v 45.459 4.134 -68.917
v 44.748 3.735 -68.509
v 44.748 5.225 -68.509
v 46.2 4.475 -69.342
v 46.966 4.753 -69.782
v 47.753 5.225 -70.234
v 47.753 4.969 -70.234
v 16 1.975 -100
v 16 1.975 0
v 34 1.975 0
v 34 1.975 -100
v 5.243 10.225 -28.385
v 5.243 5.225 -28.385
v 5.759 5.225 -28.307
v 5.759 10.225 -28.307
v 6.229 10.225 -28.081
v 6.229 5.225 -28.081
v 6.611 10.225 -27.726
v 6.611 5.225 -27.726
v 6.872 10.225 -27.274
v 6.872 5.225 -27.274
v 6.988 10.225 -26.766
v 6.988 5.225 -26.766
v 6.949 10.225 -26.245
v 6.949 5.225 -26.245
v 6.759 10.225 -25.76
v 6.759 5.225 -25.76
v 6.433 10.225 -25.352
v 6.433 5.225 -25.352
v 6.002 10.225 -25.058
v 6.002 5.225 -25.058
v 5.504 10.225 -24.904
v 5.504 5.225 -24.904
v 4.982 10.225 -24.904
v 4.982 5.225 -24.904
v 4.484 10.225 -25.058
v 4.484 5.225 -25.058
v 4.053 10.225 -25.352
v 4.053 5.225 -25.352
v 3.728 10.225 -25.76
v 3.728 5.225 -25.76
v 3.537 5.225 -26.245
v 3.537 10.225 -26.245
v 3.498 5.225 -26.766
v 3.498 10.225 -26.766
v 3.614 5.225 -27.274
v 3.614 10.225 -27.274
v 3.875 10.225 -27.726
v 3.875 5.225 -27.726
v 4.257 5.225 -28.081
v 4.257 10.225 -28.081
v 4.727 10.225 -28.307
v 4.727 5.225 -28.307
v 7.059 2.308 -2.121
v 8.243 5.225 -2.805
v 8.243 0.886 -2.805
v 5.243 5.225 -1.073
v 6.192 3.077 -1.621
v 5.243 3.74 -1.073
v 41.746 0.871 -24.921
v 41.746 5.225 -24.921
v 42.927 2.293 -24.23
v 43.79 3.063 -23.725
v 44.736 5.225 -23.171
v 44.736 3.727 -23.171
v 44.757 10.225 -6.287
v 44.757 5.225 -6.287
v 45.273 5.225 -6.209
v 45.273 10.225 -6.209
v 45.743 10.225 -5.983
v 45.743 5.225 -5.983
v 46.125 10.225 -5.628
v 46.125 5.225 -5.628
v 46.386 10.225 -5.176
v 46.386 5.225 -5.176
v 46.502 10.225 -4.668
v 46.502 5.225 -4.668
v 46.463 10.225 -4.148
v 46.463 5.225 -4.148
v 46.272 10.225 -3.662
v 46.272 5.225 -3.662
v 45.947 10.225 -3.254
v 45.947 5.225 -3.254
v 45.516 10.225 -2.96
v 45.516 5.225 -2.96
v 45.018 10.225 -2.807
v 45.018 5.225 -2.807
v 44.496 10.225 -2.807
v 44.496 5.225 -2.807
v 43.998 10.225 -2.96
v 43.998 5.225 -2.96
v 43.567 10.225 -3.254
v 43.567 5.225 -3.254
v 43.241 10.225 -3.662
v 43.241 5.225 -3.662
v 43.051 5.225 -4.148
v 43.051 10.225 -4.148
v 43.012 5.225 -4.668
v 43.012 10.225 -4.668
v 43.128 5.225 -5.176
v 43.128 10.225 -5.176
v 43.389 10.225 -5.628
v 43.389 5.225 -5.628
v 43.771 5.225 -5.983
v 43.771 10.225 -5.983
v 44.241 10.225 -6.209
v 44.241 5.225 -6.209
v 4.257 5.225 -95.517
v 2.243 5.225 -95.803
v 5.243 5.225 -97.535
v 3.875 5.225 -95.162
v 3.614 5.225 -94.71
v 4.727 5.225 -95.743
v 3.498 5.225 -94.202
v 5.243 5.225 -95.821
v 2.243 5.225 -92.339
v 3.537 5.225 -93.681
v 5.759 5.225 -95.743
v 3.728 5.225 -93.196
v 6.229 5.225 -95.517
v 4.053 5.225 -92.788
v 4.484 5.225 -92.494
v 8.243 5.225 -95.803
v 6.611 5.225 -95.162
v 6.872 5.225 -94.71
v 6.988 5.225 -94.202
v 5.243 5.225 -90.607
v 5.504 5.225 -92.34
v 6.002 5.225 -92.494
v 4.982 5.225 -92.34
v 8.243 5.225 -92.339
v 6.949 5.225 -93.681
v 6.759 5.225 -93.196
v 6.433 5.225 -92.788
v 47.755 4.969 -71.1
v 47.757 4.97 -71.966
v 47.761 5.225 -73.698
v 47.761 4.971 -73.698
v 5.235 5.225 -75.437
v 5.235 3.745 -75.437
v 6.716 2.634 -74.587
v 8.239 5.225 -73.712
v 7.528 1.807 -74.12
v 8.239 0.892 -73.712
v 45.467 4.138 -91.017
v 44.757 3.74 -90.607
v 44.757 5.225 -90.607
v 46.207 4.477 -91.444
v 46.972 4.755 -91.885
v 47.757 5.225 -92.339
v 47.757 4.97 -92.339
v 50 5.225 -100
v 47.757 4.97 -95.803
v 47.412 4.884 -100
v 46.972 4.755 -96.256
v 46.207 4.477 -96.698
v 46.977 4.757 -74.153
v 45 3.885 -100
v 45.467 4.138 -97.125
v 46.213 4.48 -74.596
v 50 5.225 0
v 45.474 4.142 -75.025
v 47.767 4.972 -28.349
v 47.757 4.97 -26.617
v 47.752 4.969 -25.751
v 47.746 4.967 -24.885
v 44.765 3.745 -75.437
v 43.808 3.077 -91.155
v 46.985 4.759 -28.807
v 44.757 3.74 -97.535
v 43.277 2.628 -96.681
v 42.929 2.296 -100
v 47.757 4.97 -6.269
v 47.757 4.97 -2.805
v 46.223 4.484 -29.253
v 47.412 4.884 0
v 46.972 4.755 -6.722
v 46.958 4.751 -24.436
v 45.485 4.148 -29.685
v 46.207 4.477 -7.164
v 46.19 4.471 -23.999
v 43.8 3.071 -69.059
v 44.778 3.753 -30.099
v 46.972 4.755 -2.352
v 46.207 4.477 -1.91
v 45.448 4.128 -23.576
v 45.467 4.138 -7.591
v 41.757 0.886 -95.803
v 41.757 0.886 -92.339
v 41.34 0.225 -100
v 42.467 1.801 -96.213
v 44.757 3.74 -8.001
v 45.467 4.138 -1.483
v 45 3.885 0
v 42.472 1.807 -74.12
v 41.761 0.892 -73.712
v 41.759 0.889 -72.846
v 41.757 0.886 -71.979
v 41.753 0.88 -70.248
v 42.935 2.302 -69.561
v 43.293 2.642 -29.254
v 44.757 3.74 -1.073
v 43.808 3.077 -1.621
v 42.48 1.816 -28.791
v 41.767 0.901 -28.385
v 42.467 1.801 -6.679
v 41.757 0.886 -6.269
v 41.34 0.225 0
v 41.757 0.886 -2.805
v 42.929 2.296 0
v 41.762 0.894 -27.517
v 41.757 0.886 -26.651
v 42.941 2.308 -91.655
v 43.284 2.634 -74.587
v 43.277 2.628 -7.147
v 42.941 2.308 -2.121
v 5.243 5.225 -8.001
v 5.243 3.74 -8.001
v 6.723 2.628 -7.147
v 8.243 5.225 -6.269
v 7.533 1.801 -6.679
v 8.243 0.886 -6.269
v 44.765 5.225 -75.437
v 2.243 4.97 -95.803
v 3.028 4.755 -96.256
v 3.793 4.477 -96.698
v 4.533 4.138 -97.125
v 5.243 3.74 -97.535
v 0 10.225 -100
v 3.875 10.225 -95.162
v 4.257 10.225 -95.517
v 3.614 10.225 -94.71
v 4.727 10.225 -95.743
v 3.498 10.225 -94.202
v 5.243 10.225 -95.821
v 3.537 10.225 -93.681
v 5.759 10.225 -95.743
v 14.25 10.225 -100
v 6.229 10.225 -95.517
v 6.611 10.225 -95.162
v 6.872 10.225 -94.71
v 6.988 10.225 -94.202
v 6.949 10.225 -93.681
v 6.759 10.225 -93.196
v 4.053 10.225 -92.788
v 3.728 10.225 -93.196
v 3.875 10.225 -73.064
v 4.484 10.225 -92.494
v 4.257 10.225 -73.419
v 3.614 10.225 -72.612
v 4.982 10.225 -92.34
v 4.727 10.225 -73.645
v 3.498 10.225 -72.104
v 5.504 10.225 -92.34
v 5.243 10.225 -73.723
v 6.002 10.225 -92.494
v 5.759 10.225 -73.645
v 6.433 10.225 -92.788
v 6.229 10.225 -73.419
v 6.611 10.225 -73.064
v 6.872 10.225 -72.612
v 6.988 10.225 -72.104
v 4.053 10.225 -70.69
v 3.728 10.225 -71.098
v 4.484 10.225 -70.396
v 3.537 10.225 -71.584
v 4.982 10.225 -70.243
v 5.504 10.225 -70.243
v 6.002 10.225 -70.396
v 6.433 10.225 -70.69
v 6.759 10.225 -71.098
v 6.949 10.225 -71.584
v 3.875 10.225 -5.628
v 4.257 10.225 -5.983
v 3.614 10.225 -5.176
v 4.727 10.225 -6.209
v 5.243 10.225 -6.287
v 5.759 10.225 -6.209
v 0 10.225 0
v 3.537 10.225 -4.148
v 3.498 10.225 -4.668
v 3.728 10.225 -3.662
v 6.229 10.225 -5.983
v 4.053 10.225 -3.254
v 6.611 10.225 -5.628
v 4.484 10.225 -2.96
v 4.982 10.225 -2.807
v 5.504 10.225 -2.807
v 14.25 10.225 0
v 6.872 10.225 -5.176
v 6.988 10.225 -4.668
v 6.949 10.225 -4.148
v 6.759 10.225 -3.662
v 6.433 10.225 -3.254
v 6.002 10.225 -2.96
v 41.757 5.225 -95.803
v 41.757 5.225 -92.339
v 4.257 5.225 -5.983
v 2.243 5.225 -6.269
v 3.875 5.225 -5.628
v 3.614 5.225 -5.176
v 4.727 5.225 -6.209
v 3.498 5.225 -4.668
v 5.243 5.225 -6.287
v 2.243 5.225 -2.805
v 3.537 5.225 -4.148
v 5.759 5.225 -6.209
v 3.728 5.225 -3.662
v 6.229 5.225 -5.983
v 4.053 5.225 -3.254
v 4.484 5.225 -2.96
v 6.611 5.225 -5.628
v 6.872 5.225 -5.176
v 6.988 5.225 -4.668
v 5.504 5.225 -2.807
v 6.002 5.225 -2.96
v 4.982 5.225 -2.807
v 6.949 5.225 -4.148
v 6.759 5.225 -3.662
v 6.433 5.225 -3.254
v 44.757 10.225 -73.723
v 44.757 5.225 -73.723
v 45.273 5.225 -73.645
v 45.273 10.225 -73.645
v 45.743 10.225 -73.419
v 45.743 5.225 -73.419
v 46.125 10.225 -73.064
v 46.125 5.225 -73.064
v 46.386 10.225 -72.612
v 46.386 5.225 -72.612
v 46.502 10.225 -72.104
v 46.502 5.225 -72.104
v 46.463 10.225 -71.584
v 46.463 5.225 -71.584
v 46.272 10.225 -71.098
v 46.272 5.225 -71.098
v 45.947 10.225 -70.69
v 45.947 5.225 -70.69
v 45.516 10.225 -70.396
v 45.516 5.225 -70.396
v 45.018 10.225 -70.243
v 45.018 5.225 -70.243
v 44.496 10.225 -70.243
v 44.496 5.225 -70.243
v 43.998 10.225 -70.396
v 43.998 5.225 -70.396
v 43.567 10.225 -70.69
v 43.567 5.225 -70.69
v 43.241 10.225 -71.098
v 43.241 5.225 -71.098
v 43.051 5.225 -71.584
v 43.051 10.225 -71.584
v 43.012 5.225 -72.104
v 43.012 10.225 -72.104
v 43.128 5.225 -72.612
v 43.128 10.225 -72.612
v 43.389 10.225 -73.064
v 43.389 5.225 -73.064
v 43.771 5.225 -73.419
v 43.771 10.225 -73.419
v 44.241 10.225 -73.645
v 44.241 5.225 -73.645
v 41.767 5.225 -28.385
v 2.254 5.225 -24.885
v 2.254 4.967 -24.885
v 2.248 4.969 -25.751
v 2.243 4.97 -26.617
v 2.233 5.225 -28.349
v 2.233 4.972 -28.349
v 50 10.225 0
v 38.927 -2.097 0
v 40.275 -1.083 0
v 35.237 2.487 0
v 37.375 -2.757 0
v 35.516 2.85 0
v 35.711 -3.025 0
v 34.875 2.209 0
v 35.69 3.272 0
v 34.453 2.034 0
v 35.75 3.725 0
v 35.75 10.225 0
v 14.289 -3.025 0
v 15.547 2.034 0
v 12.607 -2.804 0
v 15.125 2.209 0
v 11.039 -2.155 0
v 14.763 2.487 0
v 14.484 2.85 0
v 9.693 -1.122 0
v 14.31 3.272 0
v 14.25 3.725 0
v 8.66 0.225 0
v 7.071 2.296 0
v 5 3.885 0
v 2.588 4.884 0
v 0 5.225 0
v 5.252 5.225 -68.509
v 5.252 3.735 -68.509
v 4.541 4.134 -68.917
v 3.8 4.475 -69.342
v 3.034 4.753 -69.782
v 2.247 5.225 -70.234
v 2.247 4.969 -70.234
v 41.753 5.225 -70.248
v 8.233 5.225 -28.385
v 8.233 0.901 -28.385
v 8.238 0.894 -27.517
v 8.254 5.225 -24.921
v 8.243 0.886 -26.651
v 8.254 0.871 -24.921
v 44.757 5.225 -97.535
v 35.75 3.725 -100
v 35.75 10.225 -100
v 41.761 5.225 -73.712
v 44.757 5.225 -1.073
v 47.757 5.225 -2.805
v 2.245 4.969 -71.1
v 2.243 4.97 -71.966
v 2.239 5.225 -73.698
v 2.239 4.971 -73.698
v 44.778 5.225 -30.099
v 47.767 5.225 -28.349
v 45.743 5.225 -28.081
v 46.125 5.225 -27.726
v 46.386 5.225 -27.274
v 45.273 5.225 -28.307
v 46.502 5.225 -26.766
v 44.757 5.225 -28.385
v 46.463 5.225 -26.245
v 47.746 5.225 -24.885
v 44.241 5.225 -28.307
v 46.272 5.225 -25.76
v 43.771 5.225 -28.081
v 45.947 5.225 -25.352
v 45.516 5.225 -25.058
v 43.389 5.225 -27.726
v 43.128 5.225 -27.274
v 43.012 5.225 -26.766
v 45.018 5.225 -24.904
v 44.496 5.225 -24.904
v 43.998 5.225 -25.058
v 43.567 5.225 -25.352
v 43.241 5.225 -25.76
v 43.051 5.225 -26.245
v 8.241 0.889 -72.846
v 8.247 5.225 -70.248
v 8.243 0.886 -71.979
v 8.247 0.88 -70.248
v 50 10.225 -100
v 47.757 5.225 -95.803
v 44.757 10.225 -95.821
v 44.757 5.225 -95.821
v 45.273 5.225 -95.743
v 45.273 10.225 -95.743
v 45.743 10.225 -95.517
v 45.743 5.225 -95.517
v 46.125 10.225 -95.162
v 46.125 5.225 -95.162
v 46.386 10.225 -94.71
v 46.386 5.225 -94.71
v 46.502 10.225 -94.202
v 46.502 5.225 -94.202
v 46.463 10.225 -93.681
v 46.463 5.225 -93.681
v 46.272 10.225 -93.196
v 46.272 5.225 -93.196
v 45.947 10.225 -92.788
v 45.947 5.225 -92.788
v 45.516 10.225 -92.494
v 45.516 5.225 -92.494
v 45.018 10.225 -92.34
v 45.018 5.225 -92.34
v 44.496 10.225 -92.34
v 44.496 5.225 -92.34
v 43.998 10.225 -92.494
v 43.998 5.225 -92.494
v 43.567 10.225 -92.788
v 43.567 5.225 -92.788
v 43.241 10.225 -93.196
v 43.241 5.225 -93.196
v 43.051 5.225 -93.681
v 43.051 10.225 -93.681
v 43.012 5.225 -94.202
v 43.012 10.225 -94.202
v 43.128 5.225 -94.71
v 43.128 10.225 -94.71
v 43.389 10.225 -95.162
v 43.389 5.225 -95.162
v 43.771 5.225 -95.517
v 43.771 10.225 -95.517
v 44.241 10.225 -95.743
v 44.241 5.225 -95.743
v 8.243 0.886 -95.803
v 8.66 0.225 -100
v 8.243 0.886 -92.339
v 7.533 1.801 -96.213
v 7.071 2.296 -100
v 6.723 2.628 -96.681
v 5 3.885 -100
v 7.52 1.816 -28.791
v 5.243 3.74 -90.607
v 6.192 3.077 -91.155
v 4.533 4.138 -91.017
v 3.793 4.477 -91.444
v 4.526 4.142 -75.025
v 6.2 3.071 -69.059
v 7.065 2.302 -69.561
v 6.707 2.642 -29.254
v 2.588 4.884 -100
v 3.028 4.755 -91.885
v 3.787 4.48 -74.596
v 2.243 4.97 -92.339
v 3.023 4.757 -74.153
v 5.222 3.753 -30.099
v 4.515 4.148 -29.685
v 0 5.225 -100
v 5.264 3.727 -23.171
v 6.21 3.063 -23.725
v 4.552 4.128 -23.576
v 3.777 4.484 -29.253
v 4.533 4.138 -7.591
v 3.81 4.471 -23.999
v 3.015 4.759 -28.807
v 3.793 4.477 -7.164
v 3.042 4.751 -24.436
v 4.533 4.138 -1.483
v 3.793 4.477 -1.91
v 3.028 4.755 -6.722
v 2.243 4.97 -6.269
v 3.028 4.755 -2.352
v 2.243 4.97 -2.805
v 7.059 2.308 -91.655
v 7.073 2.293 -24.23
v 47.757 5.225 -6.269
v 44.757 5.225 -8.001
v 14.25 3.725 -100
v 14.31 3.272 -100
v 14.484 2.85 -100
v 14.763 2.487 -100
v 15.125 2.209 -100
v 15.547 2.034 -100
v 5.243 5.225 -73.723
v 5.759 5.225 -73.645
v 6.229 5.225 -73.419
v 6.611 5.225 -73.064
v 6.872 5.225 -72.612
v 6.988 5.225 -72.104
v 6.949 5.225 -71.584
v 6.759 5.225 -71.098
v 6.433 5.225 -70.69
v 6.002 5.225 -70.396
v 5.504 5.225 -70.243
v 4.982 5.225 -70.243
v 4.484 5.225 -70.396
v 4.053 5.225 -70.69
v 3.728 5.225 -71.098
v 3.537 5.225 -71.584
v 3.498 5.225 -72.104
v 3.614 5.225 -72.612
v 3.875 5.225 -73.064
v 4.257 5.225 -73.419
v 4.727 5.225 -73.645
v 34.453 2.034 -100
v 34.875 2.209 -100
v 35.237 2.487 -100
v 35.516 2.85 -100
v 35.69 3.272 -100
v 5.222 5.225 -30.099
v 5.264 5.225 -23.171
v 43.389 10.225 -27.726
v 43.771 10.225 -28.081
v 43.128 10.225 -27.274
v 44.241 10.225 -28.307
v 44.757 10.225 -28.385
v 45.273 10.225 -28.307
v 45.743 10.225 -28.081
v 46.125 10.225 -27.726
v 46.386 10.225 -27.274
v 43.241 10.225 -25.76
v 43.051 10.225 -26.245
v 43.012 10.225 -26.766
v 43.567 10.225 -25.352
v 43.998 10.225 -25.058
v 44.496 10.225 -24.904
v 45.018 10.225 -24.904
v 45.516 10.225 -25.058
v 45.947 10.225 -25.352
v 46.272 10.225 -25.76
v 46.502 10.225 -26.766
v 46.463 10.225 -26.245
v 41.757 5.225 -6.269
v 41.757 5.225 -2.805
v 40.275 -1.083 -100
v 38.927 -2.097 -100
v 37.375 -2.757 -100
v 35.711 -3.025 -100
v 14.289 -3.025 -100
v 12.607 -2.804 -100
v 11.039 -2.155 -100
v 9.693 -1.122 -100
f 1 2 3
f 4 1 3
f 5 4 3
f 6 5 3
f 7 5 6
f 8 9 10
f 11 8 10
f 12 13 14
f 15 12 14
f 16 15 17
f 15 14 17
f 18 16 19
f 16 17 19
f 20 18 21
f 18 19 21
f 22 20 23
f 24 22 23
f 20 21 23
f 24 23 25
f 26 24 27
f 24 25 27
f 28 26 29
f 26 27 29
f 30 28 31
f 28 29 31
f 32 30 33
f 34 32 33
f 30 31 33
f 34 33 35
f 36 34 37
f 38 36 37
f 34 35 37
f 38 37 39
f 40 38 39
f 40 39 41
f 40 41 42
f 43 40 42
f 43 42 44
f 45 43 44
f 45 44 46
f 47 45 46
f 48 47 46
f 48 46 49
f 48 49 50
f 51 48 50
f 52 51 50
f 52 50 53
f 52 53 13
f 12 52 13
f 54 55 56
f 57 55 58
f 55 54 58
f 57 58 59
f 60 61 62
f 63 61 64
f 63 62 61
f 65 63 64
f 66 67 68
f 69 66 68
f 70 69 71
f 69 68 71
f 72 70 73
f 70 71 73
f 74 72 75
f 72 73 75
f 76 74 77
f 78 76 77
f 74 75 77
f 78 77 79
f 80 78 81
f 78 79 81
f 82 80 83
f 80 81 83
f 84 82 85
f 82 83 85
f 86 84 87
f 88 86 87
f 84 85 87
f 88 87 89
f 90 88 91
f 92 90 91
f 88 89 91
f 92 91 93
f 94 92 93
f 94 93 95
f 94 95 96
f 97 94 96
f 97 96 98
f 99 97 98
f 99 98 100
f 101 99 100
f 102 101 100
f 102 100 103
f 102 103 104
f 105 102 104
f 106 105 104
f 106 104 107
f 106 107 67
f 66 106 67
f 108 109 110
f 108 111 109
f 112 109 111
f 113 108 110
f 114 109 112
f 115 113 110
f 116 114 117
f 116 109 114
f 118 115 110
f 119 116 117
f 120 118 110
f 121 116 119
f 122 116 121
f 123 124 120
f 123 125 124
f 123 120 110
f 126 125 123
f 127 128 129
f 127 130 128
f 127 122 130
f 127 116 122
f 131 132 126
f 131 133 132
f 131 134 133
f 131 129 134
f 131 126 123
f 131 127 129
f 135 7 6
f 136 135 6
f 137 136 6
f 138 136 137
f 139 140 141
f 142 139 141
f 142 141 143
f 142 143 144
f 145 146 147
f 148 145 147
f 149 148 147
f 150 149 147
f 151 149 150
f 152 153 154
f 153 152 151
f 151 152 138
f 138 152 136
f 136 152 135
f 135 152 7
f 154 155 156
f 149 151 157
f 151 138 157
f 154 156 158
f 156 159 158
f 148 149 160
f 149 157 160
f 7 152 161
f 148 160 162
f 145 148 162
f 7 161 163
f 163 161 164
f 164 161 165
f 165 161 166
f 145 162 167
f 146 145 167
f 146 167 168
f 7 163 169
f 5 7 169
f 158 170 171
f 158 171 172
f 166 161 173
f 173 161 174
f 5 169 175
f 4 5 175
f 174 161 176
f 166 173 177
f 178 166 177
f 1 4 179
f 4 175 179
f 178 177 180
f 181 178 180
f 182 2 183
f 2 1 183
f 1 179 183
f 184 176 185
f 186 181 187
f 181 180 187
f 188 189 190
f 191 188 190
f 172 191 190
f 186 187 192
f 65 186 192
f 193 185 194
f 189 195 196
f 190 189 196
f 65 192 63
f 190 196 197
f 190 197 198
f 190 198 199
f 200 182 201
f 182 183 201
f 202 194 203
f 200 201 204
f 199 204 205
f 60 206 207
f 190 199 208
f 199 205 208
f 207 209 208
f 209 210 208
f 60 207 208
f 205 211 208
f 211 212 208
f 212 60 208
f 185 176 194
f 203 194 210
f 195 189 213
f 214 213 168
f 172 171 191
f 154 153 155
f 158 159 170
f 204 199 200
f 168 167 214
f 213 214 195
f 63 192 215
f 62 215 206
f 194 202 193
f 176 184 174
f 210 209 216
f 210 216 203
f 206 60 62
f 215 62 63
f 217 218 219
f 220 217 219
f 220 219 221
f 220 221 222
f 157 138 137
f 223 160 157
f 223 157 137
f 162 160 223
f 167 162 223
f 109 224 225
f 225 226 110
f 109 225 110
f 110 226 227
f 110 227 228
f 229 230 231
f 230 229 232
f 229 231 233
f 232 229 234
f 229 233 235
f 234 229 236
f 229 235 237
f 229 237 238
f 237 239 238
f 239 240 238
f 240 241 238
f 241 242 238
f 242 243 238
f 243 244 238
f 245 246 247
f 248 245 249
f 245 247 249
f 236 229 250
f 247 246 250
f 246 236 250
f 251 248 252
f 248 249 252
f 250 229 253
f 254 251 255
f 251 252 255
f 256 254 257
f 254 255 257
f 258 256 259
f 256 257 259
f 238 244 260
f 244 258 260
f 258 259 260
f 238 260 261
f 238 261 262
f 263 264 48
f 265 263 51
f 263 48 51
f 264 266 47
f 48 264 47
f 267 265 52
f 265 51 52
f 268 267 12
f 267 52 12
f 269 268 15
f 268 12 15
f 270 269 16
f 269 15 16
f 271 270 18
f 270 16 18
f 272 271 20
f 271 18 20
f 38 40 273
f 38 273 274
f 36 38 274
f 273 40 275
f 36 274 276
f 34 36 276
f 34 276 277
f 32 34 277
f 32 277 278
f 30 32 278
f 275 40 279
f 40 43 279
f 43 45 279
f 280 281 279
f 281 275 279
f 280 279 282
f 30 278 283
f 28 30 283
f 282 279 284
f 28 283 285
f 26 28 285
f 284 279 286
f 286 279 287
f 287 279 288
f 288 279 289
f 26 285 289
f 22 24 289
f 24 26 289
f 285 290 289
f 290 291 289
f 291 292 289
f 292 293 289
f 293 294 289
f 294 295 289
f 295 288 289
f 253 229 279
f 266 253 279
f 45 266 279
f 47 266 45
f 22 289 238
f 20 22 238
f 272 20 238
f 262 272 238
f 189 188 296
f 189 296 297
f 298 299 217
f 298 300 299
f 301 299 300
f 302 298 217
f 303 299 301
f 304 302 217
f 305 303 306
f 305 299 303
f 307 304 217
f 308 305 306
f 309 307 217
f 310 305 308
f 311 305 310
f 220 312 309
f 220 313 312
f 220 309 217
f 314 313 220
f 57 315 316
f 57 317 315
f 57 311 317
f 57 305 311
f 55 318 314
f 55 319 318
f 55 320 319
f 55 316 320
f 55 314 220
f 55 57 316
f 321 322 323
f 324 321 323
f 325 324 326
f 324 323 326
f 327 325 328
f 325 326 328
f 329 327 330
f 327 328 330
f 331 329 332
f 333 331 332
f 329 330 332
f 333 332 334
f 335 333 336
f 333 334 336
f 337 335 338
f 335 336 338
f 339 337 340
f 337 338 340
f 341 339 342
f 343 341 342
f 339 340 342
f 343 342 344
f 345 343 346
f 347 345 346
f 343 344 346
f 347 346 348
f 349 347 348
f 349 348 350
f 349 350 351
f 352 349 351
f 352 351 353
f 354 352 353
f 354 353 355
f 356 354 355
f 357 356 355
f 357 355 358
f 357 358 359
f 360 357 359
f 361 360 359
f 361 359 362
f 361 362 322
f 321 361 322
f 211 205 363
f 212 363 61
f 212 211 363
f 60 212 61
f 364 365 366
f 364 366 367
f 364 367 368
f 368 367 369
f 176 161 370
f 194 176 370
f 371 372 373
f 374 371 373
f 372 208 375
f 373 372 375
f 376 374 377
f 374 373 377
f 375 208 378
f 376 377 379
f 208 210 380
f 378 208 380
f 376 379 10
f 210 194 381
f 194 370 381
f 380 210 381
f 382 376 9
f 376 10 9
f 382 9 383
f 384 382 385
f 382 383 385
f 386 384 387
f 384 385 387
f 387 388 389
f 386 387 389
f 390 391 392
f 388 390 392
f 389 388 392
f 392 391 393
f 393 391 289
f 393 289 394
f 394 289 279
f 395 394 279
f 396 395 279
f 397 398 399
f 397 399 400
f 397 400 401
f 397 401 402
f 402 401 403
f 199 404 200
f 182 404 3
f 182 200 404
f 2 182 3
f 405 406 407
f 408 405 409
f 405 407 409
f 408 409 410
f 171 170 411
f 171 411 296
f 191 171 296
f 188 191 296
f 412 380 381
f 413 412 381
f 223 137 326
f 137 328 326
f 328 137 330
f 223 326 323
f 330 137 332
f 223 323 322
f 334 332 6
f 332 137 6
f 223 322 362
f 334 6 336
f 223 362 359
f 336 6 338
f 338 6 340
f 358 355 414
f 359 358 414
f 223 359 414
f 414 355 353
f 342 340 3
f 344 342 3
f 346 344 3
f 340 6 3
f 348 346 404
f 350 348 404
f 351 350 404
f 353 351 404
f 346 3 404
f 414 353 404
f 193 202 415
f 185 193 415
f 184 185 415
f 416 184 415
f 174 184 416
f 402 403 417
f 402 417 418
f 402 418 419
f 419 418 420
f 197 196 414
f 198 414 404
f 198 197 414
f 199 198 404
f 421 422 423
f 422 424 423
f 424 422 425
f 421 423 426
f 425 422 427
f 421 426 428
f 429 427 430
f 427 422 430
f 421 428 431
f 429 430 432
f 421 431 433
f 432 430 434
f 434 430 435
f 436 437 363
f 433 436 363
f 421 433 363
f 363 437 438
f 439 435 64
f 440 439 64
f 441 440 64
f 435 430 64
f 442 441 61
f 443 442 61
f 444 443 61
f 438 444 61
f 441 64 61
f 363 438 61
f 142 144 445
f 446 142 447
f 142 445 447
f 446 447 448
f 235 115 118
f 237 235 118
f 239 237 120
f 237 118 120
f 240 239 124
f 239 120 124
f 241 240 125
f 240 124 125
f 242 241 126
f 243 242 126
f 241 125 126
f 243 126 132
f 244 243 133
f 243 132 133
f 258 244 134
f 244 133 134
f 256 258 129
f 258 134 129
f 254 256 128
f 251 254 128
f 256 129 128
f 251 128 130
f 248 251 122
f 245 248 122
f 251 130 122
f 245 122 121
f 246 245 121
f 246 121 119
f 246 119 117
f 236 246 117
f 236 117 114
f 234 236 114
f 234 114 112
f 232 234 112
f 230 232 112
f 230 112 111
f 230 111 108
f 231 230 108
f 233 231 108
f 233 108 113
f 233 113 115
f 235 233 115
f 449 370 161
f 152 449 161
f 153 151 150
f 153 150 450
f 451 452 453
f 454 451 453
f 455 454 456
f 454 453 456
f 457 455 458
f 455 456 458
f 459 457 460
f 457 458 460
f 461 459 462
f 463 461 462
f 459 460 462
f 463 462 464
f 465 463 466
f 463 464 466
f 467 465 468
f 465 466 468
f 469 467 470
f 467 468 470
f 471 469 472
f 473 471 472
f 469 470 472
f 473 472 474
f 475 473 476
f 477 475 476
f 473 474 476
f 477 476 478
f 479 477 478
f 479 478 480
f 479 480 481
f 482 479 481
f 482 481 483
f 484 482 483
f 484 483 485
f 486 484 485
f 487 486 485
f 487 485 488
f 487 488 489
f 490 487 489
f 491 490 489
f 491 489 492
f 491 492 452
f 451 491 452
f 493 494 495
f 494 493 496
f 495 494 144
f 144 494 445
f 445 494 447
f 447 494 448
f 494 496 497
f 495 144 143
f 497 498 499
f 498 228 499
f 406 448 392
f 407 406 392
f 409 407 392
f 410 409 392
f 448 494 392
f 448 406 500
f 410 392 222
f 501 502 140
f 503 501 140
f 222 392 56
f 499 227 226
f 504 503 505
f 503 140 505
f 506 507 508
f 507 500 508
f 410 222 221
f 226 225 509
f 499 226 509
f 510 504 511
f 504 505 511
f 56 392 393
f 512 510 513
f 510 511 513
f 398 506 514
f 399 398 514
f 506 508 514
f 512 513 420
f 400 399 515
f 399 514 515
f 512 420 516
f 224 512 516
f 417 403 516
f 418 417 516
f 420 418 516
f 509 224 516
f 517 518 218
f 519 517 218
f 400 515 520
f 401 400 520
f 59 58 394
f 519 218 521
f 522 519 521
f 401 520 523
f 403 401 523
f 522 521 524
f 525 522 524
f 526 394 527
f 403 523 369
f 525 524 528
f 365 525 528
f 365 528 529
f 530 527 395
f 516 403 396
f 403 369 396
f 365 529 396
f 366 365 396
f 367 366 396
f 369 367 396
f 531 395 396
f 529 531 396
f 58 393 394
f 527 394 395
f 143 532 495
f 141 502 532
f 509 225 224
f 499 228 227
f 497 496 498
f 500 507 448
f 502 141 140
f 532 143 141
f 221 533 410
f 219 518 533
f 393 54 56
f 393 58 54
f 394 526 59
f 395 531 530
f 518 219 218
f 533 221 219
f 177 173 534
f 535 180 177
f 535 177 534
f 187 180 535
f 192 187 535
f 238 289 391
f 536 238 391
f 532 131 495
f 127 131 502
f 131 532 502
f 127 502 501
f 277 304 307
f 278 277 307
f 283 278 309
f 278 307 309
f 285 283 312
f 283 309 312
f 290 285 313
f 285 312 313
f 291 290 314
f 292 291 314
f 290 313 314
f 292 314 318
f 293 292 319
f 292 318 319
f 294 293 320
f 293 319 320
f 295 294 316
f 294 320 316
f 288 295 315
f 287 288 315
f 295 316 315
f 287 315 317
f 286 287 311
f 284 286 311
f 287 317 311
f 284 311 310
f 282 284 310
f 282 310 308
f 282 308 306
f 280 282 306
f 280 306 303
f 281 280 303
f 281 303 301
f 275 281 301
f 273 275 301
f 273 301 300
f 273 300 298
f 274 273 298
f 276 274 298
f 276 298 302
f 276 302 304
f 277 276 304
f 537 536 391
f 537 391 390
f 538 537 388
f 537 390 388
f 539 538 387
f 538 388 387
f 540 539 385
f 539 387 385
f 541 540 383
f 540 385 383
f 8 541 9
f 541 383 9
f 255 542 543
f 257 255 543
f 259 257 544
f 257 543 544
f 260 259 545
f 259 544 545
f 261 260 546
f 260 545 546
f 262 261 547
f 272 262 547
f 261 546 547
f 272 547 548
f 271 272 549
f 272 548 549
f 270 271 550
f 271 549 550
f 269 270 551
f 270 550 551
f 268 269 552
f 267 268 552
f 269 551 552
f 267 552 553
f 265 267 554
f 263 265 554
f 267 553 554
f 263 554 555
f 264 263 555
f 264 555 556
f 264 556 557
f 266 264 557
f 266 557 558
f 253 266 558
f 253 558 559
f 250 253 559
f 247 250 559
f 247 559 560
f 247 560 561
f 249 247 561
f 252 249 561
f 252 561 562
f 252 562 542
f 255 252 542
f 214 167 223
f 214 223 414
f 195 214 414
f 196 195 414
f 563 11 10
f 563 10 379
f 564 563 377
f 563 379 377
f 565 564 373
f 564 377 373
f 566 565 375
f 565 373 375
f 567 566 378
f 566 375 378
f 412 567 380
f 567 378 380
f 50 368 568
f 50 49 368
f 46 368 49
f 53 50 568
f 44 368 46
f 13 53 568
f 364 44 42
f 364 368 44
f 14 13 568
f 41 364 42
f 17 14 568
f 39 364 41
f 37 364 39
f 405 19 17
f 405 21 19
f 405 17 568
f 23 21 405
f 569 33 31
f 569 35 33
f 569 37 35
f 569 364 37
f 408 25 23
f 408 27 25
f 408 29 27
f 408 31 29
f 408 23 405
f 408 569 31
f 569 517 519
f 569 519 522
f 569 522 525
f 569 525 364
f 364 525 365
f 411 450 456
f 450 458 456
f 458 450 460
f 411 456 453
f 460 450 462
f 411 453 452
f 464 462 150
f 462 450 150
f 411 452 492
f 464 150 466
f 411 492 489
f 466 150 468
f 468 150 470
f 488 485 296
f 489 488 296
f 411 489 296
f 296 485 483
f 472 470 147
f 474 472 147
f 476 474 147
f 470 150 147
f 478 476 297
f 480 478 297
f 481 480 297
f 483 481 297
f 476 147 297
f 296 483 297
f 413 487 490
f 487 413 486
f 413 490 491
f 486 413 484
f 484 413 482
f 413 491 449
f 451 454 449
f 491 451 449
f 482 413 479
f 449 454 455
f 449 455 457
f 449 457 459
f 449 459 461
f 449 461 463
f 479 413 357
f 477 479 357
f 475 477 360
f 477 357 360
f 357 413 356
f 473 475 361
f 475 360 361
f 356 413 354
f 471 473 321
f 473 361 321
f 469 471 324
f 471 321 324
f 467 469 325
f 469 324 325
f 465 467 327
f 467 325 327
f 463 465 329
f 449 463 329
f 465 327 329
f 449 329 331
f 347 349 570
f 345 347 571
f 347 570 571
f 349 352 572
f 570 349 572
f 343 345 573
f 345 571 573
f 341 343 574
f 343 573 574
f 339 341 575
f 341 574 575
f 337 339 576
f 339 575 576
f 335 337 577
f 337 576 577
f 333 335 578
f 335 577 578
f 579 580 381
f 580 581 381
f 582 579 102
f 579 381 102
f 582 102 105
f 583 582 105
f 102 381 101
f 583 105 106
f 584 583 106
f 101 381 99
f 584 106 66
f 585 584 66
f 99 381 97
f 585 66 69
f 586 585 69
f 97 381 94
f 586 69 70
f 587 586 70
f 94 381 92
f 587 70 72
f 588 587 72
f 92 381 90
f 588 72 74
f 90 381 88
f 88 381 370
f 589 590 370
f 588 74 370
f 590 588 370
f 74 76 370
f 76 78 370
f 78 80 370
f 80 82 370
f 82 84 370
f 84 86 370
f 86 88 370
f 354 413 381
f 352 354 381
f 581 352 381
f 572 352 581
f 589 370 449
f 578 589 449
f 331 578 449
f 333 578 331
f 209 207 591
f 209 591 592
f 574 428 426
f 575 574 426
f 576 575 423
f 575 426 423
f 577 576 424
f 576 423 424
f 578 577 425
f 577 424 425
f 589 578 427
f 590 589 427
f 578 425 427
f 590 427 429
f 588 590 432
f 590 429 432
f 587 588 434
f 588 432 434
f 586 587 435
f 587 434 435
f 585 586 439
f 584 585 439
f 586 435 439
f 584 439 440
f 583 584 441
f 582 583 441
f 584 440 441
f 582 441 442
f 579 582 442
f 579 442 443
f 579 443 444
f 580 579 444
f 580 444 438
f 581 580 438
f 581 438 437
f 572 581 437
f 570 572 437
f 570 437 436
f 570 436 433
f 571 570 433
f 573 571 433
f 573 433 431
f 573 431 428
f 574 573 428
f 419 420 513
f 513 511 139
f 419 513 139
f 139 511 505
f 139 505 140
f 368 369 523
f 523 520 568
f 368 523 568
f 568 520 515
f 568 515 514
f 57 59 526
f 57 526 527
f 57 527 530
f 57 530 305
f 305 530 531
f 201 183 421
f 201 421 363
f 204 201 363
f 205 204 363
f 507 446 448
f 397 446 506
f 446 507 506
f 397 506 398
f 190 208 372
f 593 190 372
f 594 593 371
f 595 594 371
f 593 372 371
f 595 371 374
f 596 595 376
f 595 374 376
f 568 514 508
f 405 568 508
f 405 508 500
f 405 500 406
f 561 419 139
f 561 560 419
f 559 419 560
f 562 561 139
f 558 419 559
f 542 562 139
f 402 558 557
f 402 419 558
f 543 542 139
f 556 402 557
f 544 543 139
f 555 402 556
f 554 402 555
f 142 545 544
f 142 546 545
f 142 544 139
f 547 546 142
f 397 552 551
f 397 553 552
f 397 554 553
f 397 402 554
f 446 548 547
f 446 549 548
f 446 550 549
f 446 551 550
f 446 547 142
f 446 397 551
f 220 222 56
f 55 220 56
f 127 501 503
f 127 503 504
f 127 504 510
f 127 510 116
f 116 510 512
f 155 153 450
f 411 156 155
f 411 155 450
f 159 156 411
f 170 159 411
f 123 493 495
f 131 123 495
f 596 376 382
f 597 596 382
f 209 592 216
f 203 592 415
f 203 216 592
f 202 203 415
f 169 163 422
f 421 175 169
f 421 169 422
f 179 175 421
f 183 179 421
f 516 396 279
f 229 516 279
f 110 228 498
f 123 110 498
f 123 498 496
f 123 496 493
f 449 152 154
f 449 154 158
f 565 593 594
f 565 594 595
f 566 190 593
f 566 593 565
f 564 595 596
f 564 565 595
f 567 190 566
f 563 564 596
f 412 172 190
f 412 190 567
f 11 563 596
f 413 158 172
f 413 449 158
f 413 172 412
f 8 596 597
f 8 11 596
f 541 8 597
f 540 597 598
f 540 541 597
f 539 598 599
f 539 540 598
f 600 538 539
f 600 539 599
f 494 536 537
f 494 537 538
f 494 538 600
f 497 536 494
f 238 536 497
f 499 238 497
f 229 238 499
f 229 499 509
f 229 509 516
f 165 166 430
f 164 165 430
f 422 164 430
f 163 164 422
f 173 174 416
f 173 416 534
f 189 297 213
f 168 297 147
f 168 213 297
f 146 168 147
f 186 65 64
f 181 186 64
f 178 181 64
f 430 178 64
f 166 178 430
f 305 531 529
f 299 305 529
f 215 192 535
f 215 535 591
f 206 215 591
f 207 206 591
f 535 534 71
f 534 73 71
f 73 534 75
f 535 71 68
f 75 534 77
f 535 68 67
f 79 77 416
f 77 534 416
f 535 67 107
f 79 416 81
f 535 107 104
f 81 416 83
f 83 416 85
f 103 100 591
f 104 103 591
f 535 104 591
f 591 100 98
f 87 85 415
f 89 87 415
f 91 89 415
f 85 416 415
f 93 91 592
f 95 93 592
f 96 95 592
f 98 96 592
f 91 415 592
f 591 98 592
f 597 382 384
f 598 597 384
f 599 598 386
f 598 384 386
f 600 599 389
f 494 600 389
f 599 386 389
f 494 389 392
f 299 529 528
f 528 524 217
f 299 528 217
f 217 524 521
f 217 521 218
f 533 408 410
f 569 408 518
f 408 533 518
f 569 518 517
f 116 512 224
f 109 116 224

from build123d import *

# Parameters (mm, degrees)
BOSS_EXTRUDE1_DEPTH = 100
SKETCH2_R           = 1.75
CUT_EXTRUDE1_DEPTH  = 113.585800614
CUT_EXTRUDE2_DEPTH  = 8.25


with BuildPart() as part:
    # Sketch1 → Boss-Extrude1 (new body)
    with BuildSketch(Plane.XY):
        with BuildLine():
            Line((50, 10.224622738), (50, 5.224622738))
            ThreePointArc((50, 5.224622738), (45, 3.884876776), (41.339745962, 0.224622738))
            ThreePointArc((41.339745962, 0.224622738), (38.927083678, -2.096523604), (35.710580838, -3.025377262))
            Line((35.710580838, -3.025377262), (14.289419162, -3.025377262))
            ThreePointArc((14.289419162, -3.025377262), (11.039419162, -2.154542386), (8.660254038, 0.224622738))
            ThreePointArc((8.660254038, 0.224622738), (5, 3.884876776), (0, 5.224622738))
            Line((0, 5.224622738), (0, 10.224622738))
            Line((0, 10.224622738), (14.25, 10.224622738))
            Line((14.25, 10.224622738), (14.25, 3.724622738))
            ThreePointArc((14.25, 3.724622738), (14.762563133, 2.487185871), (16, 1.974622738))
            Line((16, 1.974622738), (34, 1.974622738))
            ThreePointArc((34, 1.974622738), (35.237436867, 2.487185871), (35.75, 3.724622738))
            Line((35.75, 3.724622738), (35.75, 10.224622738))
            Line((35.75, 10.224622738), (50, 10.224622738))
        make_face()
    extrude(amount=-BOSS_EXTRUDE1_DEPTH)

    # Sketch2 → Cut-Extrude1 (cut, through all)
    with BuildSketch(Plane.XZ.offset(3.025377262)):
        with Locations(Location((44.756824718, -26.634894448, 0), (0, 0, 270))):
            Circle(SKETCH2_R)
        with Locations(Location((44.756824718, -4.537105649, 0), (0, 0, 270))):
            Circle(SKETCH2_R)
        with Locations(Location((44.756824718, -71.972969116, 0), (0, 0, 270))):
            Circle(SKETCH2_R)
        with Locations(Location((44.756824718, -94.070757915, 0), (0, 0, 270))):
            Circle(SKETCH2_R)
        with Locations(Location((5.243175282, -71.972969116, 0), (0, 0, 270))):
            Circle(SKETCH2_R)
        with Locations(Location((5.243175282, -94.070757915, 0), (0, 0, 270))):
            Circle(SKETCH2_R)
        with Locations(Location((5.243175282, -26.634894448, 0), (0, 0, 270))):
            Circle(SKETCH2_R)
        with Locations(Location((5.243175282, -4.537105649, 0), (0, 0, 270))):
            Circle(SKETCH2_R)
    extrude(amount=-CUT_EXTRUDE1_DEPTH, mode=Mode.SUBTRACT)

    # Sketch3 → Cut-Extrude2 (cut)
    with BuildSketch(Plane.XZ.offset(3.025377262)):
        Polygon((8.243175282, -2.805054841), (5.243175282, -1.073004033), (2.243175282, -2.805054841), (2.243175282, -6.269156456), (5.243175282, -8.001207264), (8.243175282, -6.269156456), align=None)
        Polygon((5.264020111, -23.170855549), (2.25365201, -24.884822847), (2.232807181, -28.348861746), (5.222330453, -30.098933346), (8.232698554, -28.384966048), (8.253543382, -24.920927149), align=None)
        Polygon((41.746456618, -24.920927149), (44.735979889, -23.170855549), (47.74634799, -24.884822847), (47.767192819, -28.348861746), (44.777669547, -30.098933346), (41.767301446, -28.384966048), align=None)
        Polygon((41.756824718, -6.269156456), (41.756824718, -2.805054841), (44.756824718, -1.073004033), (47.756824718, -2.805054841), (47.756824718, -6.269156456), (44.756824718, -8.001207264), align=None)
        Polygon((41.756824718, -92.338707108), (44.756824718, -90.6066563), (47.756824718, -92.338707108), (47.756824718, -95.802808723), (44.756824718, -97.534859531), (41.756824718, -95.802808723), align=None)
        Polygon((5.251618805, -68.508877791), (2.247405955, -70.233611149), (2.238962432, -73.697702473), (5.234731759, -75.437060441), (8.238944609, -73.712327084), (8.247388132, -70.248235759), align=None)
        Polygon((5.243175282, -90.6066563), (2.243175282, -92.338707108), (2.243175282, -95.802808723), (5.243175282, -97.534859531), (8.243175282, -95.802808723), (8.243175282, -92.338707108), align=None)
        Polygon((41.752611868, -70.248235759), (44.748381195, -68.508877791), (47.752594045, -70.233611149), (47.761037568, -73.697702473), (44.765268241, -75.437060441), (41.761055391, -73.712327084), align=None)
    extrude(amount=-CUT_EXTRUDE2_DEPTH, mode=Mode.SUBTRACT)


solid = part.part
